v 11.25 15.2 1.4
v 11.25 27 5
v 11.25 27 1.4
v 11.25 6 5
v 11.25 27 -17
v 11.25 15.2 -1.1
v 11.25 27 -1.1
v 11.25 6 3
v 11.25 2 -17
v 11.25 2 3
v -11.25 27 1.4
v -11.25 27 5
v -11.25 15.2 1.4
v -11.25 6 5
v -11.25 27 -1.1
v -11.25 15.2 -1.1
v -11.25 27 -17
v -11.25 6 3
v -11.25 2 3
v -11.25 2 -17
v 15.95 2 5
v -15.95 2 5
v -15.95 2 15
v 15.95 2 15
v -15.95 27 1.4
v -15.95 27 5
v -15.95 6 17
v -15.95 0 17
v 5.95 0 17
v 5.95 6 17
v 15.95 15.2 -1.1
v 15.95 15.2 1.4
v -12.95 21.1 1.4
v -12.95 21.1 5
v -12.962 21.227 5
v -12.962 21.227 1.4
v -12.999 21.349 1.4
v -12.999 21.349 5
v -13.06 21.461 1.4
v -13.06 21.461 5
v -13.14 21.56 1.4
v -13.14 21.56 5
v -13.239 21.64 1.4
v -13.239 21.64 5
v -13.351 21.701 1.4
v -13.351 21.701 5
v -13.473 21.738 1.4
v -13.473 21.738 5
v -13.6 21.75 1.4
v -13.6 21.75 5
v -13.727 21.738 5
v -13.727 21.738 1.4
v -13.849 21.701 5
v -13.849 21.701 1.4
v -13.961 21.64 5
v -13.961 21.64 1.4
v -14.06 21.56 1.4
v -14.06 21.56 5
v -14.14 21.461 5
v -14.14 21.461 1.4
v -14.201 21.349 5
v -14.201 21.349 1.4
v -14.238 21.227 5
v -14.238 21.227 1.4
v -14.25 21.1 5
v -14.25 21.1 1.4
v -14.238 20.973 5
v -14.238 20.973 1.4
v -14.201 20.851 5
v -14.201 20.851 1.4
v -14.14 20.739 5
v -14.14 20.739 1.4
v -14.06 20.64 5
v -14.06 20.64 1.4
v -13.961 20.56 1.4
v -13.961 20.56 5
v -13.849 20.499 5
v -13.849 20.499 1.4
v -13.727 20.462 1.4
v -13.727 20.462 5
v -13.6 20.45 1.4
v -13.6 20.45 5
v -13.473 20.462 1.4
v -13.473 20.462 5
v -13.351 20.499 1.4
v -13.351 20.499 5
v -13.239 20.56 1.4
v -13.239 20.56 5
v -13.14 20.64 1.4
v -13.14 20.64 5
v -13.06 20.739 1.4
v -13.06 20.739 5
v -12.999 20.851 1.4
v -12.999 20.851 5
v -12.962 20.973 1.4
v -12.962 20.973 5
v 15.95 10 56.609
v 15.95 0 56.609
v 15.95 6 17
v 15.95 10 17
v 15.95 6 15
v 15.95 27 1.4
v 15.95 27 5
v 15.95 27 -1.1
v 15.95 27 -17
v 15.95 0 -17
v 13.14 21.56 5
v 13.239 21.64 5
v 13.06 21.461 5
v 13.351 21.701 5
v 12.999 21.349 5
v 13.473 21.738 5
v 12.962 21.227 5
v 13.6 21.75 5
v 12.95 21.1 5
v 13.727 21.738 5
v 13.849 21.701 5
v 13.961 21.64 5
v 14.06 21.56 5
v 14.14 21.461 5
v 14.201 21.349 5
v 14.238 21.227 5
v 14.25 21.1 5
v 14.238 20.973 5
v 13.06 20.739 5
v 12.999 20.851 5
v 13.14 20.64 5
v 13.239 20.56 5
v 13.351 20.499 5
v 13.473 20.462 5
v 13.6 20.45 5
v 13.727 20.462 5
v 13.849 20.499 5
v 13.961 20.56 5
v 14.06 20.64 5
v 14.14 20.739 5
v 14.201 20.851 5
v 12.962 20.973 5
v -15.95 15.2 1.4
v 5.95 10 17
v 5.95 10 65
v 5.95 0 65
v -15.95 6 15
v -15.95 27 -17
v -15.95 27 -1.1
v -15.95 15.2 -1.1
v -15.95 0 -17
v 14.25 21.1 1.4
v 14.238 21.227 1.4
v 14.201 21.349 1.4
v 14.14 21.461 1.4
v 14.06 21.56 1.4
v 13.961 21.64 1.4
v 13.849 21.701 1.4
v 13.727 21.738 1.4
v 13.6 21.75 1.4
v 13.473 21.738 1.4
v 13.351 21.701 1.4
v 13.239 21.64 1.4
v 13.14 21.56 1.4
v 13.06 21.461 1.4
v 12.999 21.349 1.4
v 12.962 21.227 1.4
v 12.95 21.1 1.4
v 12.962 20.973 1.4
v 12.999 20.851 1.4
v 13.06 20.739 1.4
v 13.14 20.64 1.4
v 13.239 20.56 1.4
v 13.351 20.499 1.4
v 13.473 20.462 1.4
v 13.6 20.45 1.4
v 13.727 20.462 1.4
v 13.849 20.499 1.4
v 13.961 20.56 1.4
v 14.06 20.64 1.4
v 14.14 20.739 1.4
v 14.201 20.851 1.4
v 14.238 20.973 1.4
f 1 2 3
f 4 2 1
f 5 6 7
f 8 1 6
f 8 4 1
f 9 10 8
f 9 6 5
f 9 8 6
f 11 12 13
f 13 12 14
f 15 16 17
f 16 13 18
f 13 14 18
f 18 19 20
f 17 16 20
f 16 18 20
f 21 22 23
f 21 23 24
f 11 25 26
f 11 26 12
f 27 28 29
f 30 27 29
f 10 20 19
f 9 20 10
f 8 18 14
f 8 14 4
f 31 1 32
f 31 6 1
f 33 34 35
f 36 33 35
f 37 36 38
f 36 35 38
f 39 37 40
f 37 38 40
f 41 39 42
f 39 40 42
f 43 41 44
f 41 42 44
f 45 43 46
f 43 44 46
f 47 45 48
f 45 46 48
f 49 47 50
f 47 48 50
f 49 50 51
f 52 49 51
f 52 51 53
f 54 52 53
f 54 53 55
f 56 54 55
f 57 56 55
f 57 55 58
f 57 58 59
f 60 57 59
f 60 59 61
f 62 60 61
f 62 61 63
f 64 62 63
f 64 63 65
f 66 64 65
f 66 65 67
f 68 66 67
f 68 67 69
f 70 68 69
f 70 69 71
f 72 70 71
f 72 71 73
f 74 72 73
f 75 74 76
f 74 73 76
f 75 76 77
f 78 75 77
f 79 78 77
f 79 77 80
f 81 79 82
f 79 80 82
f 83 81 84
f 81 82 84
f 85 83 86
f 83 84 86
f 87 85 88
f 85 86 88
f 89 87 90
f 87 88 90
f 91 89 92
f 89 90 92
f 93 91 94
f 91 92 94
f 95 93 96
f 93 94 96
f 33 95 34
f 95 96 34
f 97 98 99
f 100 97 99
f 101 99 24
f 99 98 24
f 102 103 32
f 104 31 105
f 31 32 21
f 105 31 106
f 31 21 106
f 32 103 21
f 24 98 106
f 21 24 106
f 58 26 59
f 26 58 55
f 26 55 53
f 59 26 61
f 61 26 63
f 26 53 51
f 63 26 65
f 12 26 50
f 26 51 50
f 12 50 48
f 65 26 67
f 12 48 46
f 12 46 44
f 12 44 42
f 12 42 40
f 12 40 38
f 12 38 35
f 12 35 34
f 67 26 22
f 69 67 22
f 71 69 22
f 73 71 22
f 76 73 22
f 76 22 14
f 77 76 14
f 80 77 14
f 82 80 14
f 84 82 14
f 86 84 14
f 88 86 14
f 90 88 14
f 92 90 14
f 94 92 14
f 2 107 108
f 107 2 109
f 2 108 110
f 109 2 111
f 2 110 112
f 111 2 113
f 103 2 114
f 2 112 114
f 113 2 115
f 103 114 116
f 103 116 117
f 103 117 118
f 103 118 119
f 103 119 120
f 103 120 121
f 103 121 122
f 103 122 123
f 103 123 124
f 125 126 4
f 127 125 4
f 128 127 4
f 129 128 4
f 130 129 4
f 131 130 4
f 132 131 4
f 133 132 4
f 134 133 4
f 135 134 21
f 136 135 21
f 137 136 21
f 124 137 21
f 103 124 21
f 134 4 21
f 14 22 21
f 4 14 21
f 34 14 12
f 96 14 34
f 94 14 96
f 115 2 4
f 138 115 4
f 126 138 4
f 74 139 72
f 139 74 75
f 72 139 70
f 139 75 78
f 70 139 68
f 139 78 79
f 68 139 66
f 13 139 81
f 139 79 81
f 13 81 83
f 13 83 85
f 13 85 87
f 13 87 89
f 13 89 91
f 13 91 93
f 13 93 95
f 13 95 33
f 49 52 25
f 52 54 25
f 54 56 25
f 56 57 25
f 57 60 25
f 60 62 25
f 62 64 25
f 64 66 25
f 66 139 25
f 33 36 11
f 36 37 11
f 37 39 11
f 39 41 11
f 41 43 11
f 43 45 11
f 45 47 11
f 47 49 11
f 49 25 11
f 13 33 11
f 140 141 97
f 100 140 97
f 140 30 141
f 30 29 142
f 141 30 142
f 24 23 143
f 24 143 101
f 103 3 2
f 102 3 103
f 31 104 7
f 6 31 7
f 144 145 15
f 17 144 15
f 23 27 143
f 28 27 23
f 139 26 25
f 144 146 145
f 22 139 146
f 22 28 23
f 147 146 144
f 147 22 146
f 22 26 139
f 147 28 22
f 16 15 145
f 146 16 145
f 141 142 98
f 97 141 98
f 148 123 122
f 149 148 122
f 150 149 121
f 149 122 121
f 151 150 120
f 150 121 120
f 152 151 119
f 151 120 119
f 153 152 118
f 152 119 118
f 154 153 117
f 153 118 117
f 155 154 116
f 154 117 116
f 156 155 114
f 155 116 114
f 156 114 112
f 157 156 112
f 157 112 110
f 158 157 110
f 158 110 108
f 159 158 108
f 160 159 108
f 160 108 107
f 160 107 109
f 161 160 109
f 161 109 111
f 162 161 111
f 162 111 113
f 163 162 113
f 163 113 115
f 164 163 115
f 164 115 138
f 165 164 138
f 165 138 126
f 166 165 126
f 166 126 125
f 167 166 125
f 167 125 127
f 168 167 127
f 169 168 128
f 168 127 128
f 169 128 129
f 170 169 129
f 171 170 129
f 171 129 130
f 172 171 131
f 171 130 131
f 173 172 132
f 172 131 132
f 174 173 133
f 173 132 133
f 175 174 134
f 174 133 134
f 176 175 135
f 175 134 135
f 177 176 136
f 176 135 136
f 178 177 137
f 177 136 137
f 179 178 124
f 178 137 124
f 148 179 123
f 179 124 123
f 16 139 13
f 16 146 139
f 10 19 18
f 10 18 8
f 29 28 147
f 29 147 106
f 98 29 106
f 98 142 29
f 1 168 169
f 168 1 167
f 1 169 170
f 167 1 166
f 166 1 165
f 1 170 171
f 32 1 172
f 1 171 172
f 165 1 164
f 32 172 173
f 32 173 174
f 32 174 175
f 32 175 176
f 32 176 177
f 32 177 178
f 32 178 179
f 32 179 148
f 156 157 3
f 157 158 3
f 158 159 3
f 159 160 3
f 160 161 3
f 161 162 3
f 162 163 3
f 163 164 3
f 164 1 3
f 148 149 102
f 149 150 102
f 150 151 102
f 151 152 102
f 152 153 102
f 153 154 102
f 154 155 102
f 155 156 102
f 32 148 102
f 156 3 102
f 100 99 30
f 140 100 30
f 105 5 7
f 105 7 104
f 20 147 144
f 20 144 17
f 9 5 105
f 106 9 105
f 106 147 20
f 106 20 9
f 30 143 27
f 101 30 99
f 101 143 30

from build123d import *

# Parameters (mm, degrees)
SKETCH1_W           = 31.9
SKETCH1_H           = 34
BOSS_EXTRUDE3_DEPTH = 2
SKETCH2_W           = 4.7
SKETCH2_H           = 22
BOSS_EXTRUDE4_DEPTH = 25
SKETCH3_W           = 22.5
SKETCH3_H           = 2
SKETCH3_W_2         = 31.9
BOSS_EXTRUDE5_DEPTH = 4
SKETCH6_W           = 27.2
SKETCH6_H           = 2.5
SKETCH6_W_2         = 4.7
CUT_EXTRUDE1_DEPTH  = 11.8
SKETCH7_R           = 0.65
CUT_EXTRUDE2_DEPTH  = 4
BOSS_EXTRUDE6_DEPTH = 10


with BuildPart() as part:
    # Sketch1 → Boss-Extrude3 (new body)
    with BuildSketch(Plane(origin=(0, 0, 0), x_dir=(1, 0, 0), z_dir=(0, 1, 0))):
        Rectangle(SKETCH1_W, SKETCH1_H)
    extrude(amount=BOSS_EXTRUDE3_DEPTH)

    # Sketch2 → Boss-Extrude4 (add)
    with BuildSketch(Plane(origin=(0, 2, 0), x_dir=(1, 0, 0), z_dir=(0, 1, 0))):
        with Locations((-13.6, 6)):
            Rectangle(SKETCH2_W, SKETCH2_H)
        with Locations((13.6, 6)):
            Rectangle(SKETCH2_W, SKETCH2_H)
    extrude(amount=BOSS_EXTRUDE4_DEPTH)

    # Sketch3 → Boss-Extrude5 (add)
    with BuildSketch(Plane(origin=(0, 2, 0), x_dir=(1, 0, 0), z_dir=(0, 1, 0))):
        with Locations((0, -4)):
            Rectangle(SKETCH3_W, SKETCH3_H)
        with Locations((0, -16)):
            Rectangle(SKETCH3_W_2, SKETCH3_H)
    extrude(amount=BOSS_EXTRUDE5_DEPTH)

    # Sketch6 → Cut-Extrude1 (cut)
    with BuildSketch(Plane(origin=(0, 27, 0), x_dir=(1, 0, 0), z_dir=(0, 1, 0))):
        with Locations((2.35, -0.15)):
            Rectangle(SKETCH6_W, SKETCH6_H)
        with Locations((-13.6, -0.15)):
            Rectangle(SKETCH6_W_2, SKETCH6_H)
    extrude(amount=-CUT_EXTRUDE1_DEPTH, mode=Mode.SUBTRACT)

    # Sketch7 → Cut-Extrude2 (cut)
    with BuildSketch(Plane.XY.offset(5)):
        with Locations((-13.6, 21.1)):
            Circle(SKETCH7_R)
        with Locations((13.6, 21.1)):
            Circle(SKETCH7_R)
    extrude(amount=-CUT_EXTRUDE2_DEPTH, mode=Mode.SUBTRACT)

    # Sketch8 → Boss-Extrude6 (add)
    with BuildSketch(Plane(origin=(0, 0, 0), x_dir=(1, 0, 0), z_dir=(0, 1, 0))):
        Polygon((5.95, -65), (15.95, -56.609003688), (15.95, -17), (5.95, -17), align=None)
    extrude(amount=BOSS_EXTRUDE6_DEPTH)


solid = part.part
